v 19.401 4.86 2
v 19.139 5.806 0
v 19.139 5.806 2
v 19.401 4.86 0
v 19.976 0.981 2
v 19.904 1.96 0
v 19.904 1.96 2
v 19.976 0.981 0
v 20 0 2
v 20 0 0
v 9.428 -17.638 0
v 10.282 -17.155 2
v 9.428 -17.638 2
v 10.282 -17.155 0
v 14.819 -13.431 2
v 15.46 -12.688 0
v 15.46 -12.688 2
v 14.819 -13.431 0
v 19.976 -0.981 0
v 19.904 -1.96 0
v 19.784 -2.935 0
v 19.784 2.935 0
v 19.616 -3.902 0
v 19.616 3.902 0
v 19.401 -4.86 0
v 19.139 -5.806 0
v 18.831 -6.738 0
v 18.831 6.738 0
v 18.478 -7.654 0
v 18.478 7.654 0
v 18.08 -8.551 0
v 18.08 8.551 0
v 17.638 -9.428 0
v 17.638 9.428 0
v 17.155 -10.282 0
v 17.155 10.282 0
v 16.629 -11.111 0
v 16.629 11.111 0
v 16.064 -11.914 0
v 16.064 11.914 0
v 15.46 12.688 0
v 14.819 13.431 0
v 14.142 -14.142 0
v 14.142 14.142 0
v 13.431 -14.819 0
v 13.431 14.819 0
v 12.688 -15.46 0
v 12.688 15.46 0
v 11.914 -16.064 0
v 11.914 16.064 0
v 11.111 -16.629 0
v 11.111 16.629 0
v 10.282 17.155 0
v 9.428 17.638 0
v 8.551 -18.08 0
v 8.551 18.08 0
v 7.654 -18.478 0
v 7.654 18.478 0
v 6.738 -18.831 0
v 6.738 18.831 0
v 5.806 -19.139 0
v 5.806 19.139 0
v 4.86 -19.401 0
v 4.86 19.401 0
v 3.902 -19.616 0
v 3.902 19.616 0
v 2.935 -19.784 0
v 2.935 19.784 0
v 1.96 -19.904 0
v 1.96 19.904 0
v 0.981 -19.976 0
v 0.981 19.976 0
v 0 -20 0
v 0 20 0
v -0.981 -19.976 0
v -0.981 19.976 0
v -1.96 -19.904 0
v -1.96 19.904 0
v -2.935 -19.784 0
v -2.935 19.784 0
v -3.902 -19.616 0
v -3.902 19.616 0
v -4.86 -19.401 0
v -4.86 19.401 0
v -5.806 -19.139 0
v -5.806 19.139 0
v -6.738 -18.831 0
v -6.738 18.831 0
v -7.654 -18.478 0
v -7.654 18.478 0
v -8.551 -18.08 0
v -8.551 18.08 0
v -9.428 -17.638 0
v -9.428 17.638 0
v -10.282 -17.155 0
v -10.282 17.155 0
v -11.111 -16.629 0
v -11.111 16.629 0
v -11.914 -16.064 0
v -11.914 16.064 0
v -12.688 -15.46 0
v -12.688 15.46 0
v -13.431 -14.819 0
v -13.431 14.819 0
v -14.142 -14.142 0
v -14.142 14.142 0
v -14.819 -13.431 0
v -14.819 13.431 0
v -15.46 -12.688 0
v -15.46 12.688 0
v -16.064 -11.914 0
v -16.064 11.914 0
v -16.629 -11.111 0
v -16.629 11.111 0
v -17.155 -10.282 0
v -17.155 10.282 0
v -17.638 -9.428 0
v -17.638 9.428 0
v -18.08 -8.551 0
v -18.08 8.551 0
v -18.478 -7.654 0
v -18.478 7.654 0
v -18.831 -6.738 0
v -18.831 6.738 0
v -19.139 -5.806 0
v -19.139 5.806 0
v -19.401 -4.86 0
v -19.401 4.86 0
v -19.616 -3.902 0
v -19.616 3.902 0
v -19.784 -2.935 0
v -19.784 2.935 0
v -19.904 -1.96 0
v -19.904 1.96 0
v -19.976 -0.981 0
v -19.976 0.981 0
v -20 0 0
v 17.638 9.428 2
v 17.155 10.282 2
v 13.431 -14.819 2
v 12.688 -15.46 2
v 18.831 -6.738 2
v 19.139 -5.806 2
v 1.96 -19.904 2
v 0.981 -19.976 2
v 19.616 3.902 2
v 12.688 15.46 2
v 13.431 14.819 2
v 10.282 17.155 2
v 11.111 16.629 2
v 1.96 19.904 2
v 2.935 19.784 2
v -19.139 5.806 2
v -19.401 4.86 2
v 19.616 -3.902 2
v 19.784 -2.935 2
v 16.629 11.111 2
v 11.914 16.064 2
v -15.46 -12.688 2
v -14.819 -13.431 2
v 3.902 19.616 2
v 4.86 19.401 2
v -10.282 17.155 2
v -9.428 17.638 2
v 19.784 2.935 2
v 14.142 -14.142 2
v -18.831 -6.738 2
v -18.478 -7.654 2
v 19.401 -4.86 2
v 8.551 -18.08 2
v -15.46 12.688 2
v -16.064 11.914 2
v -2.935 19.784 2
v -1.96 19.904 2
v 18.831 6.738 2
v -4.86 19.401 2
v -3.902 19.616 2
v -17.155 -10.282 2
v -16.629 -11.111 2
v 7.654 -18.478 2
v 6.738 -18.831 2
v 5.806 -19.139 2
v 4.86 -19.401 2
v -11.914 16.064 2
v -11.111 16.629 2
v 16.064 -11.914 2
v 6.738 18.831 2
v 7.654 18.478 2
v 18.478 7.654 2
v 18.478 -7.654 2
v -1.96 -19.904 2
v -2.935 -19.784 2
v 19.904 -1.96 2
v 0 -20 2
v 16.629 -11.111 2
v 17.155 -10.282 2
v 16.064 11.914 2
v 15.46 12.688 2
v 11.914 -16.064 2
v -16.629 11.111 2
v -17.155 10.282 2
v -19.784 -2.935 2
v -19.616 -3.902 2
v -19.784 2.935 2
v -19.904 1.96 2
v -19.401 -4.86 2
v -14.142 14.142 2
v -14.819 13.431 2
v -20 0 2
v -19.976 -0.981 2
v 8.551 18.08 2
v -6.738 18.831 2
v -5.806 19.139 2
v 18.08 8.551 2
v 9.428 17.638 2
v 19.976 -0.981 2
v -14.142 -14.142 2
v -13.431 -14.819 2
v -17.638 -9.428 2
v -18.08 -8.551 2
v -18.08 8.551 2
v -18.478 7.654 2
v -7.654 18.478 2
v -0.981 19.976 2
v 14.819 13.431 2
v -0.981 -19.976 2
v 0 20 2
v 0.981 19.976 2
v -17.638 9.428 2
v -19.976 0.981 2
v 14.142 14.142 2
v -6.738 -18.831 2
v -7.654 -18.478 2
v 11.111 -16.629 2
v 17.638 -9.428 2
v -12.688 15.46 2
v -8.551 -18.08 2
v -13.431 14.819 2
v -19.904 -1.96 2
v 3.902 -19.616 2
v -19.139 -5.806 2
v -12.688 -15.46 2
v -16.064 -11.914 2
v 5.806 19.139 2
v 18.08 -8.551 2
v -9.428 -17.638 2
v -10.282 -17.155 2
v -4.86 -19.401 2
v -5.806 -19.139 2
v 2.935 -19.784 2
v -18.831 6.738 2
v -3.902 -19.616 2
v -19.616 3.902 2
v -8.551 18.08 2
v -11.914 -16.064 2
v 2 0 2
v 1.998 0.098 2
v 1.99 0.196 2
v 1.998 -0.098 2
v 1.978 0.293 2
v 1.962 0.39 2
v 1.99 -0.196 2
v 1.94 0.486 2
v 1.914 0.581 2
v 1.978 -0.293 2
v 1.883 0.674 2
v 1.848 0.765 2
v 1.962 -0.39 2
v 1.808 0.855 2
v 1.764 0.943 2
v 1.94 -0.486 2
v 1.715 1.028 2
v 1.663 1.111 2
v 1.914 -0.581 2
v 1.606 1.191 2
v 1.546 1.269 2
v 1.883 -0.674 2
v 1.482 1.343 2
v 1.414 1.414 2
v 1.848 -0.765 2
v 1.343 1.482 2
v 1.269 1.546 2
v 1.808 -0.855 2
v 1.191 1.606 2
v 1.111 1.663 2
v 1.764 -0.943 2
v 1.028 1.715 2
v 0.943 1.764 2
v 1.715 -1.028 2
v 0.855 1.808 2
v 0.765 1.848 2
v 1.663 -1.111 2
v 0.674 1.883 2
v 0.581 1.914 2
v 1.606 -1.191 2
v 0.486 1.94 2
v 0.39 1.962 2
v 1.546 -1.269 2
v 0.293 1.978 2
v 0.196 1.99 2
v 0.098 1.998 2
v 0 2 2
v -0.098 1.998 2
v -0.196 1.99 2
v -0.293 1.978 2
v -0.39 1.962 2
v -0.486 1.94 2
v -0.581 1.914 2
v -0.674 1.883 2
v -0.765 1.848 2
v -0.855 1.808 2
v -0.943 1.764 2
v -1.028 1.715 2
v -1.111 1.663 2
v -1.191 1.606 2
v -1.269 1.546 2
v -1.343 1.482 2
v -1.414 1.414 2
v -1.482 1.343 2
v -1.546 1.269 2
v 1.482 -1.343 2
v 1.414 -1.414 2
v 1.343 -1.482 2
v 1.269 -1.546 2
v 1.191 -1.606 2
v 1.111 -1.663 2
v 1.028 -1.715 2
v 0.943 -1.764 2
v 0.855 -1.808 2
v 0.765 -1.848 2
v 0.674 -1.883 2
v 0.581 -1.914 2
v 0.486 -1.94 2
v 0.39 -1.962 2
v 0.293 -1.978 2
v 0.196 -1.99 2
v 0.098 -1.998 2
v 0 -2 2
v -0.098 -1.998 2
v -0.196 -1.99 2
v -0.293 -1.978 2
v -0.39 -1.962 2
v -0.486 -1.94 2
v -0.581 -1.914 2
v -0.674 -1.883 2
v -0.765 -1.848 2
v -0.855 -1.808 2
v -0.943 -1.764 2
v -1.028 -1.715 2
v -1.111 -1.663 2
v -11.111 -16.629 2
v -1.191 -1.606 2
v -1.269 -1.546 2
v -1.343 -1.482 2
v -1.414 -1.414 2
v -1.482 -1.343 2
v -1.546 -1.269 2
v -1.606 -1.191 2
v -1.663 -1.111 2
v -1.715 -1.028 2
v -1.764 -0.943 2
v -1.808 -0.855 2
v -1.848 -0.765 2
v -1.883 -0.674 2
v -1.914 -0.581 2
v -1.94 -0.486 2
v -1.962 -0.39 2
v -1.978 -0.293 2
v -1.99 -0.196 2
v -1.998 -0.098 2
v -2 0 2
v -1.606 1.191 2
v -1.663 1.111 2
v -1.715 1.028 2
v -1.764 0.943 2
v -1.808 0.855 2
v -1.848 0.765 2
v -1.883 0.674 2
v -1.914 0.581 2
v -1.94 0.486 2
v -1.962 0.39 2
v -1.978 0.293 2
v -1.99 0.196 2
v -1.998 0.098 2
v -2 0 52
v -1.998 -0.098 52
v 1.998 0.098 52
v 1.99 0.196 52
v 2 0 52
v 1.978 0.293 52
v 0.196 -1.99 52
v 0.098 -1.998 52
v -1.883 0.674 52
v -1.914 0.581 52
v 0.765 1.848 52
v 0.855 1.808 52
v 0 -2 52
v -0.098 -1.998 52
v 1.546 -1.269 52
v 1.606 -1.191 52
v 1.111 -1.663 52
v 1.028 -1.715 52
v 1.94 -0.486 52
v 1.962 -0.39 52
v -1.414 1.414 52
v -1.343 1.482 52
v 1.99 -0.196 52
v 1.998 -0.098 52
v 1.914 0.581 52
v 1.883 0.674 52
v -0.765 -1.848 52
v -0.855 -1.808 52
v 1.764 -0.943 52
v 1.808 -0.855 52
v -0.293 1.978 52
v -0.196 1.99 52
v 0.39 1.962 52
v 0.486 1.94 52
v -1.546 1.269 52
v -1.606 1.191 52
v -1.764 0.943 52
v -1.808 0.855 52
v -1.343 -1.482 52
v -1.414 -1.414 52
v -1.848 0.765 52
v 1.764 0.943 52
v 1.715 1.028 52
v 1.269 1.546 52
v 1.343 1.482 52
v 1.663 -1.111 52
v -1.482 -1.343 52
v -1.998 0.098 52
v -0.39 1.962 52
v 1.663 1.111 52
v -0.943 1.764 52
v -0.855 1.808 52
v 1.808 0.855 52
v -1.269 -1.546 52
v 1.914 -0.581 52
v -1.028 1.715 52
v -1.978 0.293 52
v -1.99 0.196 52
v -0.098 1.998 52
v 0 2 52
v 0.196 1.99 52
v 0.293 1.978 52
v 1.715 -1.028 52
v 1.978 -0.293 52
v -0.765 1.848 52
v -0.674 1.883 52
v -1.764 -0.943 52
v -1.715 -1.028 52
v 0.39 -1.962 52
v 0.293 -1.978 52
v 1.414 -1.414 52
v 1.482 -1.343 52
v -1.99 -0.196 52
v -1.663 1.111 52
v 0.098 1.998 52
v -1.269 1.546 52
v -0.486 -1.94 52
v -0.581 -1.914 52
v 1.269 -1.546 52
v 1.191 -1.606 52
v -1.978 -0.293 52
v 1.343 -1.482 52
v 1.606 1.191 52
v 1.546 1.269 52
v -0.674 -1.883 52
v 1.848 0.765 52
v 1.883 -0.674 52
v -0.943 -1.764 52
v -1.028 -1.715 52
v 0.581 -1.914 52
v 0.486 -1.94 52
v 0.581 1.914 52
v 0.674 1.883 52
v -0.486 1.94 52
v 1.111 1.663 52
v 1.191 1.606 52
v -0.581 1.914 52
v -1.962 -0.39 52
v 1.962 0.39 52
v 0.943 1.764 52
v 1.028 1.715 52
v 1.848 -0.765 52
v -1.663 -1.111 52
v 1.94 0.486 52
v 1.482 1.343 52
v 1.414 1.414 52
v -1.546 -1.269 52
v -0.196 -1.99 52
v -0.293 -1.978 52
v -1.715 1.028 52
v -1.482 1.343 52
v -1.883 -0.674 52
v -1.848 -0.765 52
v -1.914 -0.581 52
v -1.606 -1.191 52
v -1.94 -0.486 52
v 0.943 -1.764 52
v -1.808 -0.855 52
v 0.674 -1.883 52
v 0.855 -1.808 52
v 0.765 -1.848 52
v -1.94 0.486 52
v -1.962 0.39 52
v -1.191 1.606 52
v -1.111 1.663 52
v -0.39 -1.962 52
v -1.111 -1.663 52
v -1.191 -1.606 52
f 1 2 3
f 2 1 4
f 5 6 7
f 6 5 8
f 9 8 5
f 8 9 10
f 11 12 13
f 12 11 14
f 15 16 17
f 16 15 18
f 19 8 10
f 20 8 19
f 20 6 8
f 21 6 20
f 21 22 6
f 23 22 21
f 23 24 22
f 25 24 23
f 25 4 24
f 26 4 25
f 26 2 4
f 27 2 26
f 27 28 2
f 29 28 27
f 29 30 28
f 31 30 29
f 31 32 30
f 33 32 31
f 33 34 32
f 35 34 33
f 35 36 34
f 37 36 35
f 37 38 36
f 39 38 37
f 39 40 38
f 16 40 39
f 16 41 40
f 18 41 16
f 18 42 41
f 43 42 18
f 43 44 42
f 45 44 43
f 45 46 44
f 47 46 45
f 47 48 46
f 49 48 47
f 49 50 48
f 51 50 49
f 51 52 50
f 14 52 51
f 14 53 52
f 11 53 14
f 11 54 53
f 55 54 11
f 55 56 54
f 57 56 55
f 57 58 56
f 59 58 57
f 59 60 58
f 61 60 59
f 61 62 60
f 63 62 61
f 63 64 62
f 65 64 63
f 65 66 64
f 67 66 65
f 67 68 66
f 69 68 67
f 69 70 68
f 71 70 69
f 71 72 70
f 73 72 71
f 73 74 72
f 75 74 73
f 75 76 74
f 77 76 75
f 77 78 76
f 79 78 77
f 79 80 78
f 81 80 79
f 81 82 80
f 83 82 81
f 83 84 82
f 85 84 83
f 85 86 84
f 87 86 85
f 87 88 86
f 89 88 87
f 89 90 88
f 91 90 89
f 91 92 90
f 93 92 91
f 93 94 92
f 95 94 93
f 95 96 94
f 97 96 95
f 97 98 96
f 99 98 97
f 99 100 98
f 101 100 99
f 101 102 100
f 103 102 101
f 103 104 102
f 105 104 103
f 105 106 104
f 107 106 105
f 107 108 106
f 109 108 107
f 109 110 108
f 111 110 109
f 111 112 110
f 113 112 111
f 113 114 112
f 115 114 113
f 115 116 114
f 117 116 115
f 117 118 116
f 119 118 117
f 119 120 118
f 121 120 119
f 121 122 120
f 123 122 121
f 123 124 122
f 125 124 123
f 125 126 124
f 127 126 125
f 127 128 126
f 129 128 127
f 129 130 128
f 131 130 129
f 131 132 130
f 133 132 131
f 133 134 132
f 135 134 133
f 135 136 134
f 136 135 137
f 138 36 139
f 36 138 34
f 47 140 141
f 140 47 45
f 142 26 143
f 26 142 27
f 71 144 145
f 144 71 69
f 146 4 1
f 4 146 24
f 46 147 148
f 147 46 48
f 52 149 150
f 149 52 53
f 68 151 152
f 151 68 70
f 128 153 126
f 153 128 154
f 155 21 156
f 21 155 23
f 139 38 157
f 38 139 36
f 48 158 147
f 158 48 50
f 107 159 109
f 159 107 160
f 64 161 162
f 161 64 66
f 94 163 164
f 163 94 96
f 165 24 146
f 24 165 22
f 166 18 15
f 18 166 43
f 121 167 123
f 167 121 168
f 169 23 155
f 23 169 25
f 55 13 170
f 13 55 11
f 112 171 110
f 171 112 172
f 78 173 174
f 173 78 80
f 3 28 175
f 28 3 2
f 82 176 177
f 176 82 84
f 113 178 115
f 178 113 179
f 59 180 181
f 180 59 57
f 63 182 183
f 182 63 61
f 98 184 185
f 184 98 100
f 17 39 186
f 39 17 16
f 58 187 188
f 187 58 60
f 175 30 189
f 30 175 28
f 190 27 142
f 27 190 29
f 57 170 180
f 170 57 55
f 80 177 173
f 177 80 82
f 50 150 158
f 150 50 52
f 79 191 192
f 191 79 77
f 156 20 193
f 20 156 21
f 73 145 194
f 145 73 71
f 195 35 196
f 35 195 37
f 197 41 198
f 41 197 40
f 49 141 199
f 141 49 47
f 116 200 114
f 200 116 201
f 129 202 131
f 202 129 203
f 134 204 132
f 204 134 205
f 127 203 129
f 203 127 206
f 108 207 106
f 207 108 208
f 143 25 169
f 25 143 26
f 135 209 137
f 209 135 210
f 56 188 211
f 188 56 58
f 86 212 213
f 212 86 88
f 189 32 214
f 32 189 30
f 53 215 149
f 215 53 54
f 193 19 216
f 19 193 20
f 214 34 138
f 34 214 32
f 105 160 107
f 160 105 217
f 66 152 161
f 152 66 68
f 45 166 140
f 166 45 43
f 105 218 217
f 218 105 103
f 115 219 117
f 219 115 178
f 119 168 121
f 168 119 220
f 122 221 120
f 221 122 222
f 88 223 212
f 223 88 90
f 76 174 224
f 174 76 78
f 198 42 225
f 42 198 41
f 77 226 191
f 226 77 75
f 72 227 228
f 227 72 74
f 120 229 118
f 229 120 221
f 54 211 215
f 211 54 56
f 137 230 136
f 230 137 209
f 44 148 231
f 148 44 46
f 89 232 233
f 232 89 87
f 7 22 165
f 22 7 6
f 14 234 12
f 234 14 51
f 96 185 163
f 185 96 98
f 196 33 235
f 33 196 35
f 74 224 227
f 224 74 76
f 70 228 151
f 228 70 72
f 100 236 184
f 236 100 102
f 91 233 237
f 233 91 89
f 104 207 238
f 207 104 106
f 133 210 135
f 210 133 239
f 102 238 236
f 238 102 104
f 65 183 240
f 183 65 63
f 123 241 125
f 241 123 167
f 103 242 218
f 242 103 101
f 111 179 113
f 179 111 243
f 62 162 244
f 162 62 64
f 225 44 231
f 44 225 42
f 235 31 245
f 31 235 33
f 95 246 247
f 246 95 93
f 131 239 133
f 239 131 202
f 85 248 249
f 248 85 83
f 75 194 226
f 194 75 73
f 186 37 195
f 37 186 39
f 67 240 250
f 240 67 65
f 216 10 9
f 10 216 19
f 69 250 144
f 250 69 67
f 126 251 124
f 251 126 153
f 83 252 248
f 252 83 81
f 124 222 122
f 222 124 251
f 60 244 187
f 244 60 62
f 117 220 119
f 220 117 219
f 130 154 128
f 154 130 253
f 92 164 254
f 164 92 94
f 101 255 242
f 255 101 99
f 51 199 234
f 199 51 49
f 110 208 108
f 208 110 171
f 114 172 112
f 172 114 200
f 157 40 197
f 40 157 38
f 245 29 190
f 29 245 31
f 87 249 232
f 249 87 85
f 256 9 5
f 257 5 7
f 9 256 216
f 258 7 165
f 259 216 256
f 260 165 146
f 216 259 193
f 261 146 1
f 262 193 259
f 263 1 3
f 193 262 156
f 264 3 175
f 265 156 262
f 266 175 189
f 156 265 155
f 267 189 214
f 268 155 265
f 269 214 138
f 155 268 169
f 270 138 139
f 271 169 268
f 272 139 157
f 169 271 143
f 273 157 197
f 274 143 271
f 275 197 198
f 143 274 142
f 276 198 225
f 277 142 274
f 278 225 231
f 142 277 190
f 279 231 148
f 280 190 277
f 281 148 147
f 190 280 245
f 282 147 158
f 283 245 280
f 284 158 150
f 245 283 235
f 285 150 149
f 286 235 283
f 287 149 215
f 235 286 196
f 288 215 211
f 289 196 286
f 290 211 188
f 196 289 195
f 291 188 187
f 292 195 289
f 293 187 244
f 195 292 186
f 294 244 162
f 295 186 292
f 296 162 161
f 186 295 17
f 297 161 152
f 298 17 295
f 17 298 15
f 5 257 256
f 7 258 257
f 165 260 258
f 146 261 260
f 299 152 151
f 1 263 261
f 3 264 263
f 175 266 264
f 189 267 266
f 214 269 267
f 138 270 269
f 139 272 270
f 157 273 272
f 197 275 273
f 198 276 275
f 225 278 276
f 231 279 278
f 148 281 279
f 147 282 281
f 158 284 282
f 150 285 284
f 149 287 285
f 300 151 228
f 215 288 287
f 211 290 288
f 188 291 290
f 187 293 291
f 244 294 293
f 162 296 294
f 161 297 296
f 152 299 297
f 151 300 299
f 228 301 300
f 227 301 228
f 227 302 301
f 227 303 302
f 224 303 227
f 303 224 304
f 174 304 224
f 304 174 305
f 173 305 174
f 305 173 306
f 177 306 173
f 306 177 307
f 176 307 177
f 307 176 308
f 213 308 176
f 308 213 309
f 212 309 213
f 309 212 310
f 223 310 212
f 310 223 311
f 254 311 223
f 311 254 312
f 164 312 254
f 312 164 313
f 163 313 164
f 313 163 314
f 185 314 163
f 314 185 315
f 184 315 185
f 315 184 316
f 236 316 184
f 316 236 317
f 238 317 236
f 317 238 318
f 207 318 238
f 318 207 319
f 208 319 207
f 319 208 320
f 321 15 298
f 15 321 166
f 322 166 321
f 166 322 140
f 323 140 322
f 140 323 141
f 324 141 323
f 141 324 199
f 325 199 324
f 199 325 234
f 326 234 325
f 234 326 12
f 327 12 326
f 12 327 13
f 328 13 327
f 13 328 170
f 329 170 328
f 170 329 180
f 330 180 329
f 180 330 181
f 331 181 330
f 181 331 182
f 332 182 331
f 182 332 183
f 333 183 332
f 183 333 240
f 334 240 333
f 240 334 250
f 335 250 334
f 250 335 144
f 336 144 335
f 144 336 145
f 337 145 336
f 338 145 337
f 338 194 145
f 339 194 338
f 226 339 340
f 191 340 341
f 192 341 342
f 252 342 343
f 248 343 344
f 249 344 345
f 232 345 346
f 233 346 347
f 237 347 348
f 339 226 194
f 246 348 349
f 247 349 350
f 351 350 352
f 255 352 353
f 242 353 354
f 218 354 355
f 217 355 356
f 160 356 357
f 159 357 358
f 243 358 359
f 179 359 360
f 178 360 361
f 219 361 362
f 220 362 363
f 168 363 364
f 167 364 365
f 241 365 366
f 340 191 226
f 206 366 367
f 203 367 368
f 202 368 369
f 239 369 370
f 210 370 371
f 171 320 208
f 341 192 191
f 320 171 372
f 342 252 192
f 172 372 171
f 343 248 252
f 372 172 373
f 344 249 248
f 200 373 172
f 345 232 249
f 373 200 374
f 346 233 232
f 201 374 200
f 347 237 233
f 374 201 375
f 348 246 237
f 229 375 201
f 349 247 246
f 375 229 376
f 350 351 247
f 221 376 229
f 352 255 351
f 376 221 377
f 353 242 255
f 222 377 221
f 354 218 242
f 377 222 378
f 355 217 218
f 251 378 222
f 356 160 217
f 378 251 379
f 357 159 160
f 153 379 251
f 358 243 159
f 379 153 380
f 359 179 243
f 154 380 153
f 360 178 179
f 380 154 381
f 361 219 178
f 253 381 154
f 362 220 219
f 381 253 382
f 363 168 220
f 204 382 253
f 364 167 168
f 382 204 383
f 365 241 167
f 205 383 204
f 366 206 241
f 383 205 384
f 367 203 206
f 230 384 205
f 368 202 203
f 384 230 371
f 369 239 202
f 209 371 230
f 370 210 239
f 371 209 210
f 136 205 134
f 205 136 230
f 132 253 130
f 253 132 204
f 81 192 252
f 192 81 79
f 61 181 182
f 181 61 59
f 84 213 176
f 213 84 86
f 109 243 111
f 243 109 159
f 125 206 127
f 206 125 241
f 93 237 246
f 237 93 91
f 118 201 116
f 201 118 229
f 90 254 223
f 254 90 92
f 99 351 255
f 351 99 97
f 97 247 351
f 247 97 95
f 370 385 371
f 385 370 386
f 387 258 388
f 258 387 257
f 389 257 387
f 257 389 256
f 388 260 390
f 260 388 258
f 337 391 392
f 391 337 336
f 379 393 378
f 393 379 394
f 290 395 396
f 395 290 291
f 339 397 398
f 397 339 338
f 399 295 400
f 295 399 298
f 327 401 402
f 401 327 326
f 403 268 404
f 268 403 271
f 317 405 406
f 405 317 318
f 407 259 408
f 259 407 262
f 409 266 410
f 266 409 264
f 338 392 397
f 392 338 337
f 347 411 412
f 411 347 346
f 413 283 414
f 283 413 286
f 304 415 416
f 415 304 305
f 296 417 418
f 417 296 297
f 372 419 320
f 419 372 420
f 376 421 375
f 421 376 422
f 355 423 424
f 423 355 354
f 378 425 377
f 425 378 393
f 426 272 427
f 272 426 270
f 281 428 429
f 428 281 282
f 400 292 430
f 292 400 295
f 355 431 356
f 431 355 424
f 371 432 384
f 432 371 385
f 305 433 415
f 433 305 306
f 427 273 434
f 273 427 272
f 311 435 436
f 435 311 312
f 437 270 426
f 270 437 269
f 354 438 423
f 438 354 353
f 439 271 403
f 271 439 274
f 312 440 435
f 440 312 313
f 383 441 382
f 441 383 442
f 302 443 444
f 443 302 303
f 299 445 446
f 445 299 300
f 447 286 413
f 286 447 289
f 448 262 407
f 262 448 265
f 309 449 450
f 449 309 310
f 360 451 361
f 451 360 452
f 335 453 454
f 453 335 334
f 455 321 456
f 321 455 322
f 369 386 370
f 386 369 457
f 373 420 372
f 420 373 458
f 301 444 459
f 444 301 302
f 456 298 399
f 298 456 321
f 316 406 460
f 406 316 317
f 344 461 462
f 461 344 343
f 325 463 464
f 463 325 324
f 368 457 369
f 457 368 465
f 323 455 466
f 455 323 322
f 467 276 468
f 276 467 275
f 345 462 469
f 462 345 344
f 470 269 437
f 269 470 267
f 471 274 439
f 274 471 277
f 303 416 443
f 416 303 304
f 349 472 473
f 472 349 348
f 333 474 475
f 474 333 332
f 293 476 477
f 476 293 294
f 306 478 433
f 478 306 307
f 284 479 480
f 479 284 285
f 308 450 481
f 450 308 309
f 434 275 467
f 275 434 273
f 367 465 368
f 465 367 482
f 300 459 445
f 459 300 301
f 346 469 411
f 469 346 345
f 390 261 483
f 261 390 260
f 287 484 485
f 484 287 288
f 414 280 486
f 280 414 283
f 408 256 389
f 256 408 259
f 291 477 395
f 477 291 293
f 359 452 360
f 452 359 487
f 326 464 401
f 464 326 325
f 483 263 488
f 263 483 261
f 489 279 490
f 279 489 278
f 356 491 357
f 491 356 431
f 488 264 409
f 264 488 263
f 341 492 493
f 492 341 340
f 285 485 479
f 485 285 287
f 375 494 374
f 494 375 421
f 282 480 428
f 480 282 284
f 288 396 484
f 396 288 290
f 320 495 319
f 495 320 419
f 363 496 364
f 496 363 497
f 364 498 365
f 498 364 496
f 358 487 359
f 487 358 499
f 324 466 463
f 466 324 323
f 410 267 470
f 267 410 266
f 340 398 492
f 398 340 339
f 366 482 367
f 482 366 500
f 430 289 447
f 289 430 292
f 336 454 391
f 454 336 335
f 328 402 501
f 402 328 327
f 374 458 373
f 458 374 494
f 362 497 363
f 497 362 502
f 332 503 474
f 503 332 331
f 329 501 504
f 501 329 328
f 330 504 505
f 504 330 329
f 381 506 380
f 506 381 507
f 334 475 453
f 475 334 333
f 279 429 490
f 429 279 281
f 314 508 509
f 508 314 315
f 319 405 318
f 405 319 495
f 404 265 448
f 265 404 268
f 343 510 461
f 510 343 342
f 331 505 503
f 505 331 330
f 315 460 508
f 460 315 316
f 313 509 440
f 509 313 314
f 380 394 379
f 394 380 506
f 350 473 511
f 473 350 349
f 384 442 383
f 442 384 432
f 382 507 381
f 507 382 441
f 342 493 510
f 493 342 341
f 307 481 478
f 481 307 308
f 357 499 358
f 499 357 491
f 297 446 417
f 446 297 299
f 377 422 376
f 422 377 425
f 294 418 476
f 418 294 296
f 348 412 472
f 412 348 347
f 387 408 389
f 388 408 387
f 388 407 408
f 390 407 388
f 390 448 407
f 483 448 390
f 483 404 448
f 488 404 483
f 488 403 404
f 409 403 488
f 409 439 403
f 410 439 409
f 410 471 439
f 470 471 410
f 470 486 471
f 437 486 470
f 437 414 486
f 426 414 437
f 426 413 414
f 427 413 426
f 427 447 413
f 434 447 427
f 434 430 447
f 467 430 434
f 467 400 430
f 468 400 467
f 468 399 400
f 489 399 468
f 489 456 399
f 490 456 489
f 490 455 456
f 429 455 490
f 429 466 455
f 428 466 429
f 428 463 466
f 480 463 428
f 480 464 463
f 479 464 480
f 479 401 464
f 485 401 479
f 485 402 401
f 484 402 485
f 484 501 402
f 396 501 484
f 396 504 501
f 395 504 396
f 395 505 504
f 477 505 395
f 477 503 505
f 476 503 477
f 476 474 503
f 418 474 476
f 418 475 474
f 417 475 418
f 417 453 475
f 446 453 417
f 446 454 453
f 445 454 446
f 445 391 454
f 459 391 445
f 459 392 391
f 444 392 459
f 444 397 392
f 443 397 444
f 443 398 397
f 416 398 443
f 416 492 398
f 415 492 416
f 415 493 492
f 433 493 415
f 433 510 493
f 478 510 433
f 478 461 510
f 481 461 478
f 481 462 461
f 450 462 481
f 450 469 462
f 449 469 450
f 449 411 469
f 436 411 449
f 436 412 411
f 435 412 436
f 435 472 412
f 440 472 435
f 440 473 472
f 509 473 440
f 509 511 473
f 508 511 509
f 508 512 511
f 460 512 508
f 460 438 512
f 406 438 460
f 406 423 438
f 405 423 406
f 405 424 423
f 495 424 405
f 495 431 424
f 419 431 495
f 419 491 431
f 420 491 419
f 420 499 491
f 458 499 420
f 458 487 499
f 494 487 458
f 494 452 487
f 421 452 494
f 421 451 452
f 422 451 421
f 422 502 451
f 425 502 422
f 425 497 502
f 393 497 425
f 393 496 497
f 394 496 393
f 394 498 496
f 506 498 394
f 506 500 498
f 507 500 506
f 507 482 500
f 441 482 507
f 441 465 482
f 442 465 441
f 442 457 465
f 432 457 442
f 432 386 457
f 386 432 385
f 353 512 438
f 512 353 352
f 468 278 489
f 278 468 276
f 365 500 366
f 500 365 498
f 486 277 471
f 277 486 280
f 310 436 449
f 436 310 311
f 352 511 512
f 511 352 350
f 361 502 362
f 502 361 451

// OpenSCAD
// file: common_params.scad
cylinder_radius = 20.000000;
cylinder_height = 60.000000;
wall_thickness = 2.000000;

cap_thickness = 2.000000;

rod_radius = 2.000000;
rod_height = 50.000000;

ring_outer_radius = 8.000000;
ring_inner_radius = 4.000000;
ring_thickness = 3.000000;
ring_z = 40.000000;

$fn = 128;
// main file
include <common_params.scad>;

union() {
    // bottom cap
    cylinder(h = cap_thickness, r = cylinder_radius);

    // rod attached to bottom cap
    translate([0, 0, cap_thickness])
        cylinder(h = rod_height, r = rod_radius);
}
